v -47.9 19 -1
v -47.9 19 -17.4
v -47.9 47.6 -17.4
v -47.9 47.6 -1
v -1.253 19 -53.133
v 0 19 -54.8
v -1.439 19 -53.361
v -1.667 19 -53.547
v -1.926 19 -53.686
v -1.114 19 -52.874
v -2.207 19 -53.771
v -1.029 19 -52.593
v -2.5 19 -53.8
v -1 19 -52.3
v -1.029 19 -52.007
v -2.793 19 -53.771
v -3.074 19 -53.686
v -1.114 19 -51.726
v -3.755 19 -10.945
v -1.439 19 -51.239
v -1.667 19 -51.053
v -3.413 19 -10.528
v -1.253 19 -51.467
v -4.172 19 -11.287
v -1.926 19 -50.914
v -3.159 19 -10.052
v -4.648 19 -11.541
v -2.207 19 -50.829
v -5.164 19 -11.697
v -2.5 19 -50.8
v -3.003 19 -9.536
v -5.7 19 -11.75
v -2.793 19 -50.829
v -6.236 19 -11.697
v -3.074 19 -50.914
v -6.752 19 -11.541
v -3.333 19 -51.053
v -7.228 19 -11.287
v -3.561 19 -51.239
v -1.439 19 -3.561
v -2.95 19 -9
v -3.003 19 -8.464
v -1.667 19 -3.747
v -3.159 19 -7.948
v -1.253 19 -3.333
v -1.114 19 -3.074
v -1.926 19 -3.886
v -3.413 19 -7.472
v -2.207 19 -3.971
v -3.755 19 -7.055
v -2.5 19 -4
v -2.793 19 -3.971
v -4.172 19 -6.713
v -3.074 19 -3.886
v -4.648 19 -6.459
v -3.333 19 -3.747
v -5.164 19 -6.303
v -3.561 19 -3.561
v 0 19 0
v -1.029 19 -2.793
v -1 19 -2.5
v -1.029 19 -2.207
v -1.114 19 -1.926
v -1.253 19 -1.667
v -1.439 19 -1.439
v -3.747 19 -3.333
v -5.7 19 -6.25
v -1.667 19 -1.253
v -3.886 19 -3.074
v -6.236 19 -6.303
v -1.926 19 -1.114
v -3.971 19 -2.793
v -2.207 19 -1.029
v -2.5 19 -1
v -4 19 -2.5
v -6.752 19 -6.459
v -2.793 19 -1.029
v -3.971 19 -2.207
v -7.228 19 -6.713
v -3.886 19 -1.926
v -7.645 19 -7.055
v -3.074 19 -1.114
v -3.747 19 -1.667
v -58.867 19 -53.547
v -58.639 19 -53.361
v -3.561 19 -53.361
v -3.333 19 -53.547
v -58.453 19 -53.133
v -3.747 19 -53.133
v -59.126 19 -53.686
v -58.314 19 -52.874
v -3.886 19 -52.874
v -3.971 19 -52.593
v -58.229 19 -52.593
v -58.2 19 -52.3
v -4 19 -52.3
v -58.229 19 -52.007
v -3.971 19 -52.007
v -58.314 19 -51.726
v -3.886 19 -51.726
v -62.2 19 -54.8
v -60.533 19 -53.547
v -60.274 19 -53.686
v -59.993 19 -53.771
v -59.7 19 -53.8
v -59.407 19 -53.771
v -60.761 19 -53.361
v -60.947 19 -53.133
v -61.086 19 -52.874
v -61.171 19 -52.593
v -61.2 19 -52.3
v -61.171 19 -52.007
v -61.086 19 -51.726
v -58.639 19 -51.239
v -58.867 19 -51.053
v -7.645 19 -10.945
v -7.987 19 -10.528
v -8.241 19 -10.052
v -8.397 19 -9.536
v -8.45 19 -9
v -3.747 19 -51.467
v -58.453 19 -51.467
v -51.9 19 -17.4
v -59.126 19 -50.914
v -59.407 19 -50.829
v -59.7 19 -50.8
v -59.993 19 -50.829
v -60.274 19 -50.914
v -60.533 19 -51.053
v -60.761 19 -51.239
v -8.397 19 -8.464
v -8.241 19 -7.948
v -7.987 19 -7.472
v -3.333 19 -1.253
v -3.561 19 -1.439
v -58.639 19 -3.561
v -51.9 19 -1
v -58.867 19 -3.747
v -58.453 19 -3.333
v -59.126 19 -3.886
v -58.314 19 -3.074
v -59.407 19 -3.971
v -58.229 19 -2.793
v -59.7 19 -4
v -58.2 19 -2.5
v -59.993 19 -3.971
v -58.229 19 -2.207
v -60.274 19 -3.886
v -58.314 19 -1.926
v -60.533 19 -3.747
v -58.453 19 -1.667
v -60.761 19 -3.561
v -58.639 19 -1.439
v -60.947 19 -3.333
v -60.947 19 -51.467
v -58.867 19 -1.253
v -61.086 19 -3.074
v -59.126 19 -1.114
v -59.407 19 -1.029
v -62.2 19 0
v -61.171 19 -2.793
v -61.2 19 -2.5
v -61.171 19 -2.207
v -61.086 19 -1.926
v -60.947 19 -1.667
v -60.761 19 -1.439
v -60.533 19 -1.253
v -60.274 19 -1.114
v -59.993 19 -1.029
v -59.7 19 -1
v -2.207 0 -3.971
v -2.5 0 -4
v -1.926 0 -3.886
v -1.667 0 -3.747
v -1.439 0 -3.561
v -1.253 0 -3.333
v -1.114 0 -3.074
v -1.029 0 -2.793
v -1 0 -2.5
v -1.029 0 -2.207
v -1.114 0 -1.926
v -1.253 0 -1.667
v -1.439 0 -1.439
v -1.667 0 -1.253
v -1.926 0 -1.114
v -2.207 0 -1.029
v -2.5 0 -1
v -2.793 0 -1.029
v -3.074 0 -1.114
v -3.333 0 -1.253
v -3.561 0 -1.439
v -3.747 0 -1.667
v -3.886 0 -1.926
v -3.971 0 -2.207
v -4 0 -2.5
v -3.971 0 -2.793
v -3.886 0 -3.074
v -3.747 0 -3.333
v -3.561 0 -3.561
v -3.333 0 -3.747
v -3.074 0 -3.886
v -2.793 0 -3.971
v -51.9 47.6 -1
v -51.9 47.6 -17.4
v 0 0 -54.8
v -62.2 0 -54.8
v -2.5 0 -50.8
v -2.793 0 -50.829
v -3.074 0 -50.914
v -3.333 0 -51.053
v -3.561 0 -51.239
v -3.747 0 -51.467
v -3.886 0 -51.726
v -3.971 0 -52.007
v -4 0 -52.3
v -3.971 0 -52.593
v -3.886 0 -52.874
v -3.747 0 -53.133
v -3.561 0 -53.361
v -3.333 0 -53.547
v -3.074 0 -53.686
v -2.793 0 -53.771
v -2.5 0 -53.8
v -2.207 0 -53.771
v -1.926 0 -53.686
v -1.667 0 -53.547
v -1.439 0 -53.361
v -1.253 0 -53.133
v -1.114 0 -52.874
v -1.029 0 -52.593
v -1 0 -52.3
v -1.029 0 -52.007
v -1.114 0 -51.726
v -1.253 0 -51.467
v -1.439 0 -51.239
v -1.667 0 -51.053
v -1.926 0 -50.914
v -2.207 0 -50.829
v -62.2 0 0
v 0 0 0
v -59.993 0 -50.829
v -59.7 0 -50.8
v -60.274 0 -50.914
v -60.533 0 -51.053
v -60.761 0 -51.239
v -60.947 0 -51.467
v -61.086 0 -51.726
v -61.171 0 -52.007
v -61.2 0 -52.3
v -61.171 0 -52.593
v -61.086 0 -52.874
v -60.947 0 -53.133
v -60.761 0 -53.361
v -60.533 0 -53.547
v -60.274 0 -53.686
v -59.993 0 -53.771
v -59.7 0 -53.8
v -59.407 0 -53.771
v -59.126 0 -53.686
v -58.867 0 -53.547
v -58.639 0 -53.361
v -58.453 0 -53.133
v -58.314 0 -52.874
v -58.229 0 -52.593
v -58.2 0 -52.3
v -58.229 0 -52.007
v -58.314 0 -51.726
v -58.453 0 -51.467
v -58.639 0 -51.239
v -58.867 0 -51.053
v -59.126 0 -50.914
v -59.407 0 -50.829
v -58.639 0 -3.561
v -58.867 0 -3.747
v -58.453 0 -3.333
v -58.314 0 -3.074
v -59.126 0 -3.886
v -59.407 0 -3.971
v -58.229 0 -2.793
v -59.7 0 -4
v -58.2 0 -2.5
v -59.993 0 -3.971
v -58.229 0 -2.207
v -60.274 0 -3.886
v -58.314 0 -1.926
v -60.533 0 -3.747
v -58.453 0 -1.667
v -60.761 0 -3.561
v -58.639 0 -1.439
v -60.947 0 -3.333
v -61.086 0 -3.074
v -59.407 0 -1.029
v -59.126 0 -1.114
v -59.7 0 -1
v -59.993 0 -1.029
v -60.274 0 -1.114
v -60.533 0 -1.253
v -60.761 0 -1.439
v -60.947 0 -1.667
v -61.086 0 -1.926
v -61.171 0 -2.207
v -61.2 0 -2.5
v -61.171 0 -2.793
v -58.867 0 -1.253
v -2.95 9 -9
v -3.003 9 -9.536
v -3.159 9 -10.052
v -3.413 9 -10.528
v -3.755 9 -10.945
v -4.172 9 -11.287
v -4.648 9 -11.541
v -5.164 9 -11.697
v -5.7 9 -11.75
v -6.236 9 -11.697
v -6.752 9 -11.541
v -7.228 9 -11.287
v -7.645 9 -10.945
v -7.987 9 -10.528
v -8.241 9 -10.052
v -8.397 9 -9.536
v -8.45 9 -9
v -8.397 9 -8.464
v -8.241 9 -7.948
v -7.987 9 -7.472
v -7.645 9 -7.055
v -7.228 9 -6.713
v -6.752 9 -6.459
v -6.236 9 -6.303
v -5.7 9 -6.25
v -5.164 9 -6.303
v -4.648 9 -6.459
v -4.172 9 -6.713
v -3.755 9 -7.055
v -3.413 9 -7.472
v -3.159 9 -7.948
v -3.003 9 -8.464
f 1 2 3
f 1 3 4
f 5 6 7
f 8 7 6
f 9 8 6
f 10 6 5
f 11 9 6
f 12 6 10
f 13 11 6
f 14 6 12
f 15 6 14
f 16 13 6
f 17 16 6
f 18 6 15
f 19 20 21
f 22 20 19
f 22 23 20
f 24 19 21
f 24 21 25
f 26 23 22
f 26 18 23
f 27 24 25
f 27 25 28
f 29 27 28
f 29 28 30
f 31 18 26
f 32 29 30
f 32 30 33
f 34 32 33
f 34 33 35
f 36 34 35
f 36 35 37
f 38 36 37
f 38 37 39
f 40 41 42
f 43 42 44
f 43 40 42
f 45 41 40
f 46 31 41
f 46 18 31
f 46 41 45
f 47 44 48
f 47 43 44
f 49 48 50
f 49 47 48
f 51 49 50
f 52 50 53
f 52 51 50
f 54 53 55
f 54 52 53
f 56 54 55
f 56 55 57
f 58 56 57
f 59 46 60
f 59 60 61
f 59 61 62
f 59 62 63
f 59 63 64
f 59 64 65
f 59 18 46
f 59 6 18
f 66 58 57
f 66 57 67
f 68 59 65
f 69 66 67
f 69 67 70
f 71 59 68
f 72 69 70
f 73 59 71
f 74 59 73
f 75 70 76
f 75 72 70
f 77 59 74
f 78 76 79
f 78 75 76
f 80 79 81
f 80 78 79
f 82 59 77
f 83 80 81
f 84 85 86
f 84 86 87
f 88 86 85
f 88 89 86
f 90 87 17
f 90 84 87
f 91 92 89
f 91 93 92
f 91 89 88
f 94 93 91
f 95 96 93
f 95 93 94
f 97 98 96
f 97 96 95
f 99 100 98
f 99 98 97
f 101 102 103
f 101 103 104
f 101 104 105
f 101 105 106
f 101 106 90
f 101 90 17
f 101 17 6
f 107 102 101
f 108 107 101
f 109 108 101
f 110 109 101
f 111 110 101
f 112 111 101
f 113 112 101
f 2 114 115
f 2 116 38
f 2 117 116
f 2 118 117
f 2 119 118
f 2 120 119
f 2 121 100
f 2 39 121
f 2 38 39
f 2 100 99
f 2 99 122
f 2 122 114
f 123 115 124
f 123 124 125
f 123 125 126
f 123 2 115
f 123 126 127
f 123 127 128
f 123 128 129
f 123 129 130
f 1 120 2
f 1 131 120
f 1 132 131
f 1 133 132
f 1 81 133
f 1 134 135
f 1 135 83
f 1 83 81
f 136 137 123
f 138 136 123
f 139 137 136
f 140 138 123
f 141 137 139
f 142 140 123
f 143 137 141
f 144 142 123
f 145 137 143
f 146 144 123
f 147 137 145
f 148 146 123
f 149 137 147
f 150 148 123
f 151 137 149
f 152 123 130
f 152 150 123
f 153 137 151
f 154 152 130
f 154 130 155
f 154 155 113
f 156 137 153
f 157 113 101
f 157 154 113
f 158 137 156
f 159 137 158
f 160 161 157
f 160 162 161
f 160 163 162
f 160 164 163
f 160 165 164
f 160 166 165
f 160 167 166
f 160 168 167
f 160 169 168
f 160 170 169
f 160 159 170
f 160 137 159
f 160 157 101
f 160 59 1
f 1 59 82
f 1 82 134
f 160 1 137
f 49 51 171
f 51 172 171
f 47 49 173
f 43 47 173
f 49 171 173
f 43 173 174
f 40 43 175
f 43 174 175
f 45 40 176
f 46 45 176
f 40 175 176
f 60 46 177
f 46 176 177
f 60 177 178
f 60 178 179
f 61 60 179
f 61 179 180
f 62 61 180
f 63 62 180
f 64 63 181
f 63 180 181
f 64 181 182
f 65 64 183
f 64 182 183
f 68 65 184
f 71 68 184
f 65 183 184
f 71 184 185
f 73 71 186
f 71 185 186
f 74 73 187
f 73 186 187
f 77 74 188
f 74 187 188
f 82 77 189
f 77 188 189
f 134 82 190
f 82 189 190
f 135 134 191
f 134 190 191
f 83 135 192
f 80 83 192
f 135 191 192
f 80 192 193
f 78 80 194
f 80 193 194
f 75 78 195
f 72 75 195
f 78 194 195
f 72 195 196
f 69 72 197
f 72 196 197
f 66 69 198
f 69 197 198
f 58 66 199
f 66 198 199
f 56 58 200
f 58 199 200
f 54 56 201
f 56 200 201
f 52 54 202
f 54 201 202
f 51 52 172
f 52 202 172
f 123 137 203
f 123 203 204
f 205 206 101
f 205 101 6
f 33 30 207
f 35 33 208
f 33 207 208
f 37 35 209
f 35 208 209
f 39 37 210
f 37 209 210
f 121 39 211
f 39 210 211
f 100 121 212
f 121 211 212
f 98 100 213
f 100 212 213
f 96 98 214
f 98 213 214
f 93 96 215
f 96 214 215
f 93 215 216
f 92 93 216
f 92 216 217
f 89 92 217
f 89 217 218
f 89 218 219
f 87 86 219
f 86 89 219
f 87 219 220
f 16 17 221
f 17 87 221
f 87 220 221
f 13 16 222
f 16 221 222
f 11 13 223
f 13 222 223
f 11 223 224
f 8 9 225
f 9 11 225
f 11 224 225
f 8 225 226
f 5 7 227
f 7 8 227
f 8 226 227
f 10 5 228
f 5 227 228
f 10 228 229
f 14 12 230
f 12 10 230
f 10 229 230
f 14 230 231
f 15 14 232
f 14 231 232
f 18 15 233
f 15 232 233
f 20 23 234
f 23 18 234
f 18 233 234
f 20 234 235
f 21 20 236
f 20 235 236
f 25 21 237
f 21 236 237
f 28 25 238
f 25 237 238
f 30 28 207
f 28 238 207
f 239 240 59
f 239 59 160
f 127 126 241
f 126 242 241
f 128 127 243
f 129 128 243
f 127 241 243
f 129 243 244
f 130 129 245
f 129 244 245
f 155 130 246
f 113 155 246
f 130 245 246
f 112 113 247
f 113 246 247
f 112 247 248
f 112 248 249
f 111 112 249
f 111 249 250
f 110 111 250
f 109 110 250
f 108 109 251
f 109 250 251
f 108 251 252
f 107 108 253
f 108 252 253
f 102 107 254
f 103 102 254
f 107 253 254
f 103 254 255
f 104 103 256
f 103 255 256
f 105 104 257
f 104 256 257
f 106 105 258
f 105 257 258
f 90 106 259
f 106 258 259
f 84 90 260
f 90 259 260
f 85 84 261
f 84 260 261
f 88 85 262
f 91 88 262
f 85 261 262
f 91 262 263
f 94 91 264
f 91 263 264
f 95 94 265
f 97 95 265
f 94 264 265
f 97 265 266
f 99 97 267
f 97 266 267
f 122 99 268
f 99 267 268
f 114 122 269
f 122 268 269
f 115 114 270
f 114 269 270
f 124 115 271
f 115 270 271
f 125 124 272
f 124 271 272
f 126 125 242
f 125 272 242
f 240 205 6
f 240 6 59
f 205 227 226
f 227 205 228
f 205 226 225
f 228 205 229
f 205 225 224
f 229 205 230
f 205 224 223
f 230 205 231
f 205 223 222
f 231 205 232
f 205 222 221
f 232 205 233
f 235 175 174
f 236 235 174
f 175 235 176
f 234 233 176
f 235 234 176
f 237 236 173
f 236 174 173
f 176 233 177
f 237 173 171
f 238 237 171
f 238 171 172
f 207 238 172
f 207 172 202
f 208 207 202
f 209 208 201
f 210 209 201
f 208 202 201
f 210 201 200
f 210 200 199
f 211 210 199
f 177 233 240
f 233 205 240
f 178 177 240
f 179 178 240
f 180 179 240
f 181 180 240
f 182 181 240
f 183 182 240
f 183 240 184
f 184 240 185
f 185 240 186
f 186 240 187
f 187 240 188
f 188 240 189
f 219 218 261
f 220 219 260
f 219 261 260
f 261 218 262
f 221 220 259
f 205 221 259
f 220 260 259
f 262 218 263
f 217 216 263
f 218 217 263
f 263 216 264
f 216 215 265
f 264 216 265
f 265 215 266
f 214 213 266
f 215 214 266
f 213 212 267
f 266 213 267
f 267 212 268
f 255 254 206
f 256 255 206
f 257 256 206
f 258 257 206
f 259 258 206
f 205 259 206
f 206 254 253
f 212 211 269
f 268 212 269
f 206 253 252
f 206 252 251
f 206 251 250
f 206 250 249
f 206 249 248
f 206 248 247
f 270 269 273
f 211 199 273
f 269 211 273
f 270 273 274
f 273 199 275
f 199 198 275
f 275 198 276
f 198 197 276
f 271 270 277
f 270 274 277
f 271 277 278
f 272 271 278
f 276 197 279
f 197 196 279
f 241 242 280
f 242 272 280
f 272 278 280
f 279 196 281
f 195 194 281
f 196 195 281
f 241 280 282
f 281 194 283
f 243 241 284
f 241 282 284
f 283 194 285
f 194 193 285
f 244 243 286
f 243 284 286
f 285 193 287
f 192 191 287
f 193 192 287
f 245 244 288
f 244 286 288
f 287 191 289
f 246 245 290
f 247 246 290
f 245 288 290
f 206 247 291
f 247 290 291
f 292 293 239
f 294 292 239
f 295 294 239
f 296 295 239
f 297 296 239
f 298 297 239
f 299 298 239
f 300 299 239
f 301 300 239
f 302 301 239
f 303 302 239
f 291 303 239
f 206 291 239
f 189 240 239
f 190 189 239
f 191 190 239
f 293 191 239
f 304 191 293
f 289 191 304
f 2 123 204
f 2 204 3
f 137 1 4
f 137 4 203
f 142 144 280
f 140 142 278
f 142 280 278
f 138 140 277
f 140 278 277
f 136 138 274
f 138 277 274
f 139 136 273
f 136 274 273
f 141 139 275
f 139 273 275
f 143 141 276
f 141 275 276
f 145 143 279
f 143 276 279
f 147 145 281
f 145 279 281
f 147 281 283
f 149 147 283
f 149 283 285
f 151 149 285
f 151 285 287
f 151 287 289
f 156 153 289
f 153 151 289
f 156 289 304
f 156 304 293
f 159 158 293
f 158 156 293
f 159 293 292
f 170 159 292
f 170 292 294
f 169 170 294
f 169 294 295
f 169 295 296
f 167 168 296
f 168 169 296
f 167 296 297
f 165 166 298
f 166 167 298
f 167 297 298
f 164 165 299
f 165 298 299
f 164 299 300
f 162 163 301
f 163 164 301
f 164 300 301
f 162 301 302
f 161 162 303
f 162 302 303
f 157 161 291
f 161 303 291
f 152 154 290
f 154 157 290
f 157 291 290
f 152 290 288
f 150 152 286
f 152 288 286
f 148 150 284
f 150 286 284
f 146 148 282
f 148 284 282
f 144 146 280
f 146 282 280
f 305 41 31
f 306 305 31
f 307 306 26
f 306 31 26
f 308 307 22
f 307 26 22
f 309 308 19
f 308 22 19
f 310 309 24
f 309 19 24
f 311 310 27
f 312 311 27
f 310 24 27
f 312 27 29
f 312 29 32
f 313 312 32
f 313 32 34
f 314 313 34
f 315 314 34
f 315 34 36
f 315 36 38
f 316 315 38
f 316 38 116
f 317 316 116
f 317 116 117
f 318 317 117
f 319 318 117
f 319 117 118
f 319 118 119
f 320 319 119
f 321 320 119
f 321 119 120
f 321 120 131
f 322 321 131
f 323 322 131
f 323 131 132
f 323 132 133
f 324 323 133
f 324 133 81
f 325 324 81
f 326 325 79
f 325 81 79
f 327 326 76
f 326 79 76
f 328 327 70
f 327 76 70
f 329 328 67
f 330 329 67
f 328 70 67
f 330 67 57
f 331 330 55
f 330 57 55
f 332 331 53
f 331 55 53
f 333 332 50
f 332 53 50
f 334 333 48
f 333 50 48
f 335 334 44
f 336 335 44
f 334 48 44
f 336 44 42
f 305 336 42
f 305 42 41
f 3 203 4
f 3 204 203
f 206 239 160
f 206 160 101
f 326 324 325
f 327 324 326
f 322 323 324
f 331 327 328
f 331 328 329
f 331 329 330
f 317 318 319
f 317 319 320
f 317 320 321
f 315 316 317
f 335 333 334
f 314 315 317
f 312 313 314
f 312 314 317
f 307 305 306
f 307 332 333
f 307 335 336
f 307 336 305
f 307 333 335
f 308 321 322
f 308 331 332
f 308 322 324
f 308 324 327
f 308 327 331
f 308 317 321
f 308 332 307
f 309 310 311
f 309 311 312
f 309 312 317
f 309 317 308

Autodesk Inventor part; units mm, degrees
ref_plane "YZ Plane" through (0, 0, 0) normal (1, 0, 0) x (0, 1, 0)
ref_plane "XZ Plane" through (0, 0, 0) normal (0, 1, 0) x (-1, 0, 0)
ref_plane "XY Plane" through (0, 0, 0) normal (0, 0, 1) x (1, 0, 0)
sketch "Sketch1" plane through (0, 0, 0) normal (0, 1, 0) x (-1, 0, 0)
  line L0 (0, 0) -> (62.2, 0)
  line L1 (62.2, 0) -> (62.2, -54.8)
  line L2 (62.2, -54.8) -> (0, -54.8)
  line L3 (0, -54.8) -> (0, 0)
  dimension "d0" = 54.8
  dimension "d1" = 62.2
extrude "Extrusion1" add sketch "Sketch1" along normal blind 19
sketch "Sketch2" plane through (0, 19, 0) normal (0, 1, 0) x (1, 0, 0)
  line L0 (-62.2, 54.8) -> (-62.2, 0) projected
  line L1 (0, 54.8) -> (-62.2, 54.8) projected
  point P0 (0, 0)
  point P1 (-59.7, 52.3)
  dimension "d4" = 2.5
  dimension "d5" = 2.5
hole "Hole1" at (-59.7, 19, -52.3) direction (0, -1, 0) diameter 3 end through all
ref_plane "Work Plane1" through (-62.2, 0, -27.4) normal (0, 0, 1) x (1, 0, 0)
ref_plane "Work Plane2" through (-31.1, 0, 0) normal (1, 0, 0) x (0, 0, -1)
mirror "Mirror1" about plane through (-62.2, 0, -27.4) normal (0, 0, 1) of "Hole1"
mirror "Mirror2" about plane through (-31.1, 0, 0) normal (1, 0, 0) of "Hole1", "Mirror1"
sketch "Sketch3" plane through (0, 19, 0) normal (0, 1, 0) x (1, 0, 0)
  line L0 (-47.9, 1) -> (-51.9, 1)
  line L1 (-51.9, 1) -> (-51.9, 17.4)
  line L2 (-51.9, 17.4) -> (-47.9, 17.4)
  line L3 (-47.9, 17.4) -> (-47.9, 1)
  line L4 (-62.2, 0) -> (0, 0) projected
  line L5 (-62.2, 54.8) -> (-62.2, 0) projected
  dimension "d13" = 4
  dimension "d14" = 16.4
  dimension "d15" = 1
  dimension "d16" = 10.3
extrude "Extrusion2" add sketch "Sketch3" along normal blind 28.6
sketch "Sketch4" plane through (0, 19, 0) normal (0, 1, 0) x (1, 0, 0)
  circle A0 centre (-5.7, 9) radius 2.75
  line L0 (-62.2, 0) -> (0, 0) projected
  line L1 (0, 0) -> (0, 54.8) projected
  dimension "d19" = 5.5
  dimension "d20" = 9
  dimension "d21" = 5.7
extrude "Extrusion3" cut sketch "Sketch4" against normal blind 10
equation "\"d5\" = d4"
properties part number "board"
